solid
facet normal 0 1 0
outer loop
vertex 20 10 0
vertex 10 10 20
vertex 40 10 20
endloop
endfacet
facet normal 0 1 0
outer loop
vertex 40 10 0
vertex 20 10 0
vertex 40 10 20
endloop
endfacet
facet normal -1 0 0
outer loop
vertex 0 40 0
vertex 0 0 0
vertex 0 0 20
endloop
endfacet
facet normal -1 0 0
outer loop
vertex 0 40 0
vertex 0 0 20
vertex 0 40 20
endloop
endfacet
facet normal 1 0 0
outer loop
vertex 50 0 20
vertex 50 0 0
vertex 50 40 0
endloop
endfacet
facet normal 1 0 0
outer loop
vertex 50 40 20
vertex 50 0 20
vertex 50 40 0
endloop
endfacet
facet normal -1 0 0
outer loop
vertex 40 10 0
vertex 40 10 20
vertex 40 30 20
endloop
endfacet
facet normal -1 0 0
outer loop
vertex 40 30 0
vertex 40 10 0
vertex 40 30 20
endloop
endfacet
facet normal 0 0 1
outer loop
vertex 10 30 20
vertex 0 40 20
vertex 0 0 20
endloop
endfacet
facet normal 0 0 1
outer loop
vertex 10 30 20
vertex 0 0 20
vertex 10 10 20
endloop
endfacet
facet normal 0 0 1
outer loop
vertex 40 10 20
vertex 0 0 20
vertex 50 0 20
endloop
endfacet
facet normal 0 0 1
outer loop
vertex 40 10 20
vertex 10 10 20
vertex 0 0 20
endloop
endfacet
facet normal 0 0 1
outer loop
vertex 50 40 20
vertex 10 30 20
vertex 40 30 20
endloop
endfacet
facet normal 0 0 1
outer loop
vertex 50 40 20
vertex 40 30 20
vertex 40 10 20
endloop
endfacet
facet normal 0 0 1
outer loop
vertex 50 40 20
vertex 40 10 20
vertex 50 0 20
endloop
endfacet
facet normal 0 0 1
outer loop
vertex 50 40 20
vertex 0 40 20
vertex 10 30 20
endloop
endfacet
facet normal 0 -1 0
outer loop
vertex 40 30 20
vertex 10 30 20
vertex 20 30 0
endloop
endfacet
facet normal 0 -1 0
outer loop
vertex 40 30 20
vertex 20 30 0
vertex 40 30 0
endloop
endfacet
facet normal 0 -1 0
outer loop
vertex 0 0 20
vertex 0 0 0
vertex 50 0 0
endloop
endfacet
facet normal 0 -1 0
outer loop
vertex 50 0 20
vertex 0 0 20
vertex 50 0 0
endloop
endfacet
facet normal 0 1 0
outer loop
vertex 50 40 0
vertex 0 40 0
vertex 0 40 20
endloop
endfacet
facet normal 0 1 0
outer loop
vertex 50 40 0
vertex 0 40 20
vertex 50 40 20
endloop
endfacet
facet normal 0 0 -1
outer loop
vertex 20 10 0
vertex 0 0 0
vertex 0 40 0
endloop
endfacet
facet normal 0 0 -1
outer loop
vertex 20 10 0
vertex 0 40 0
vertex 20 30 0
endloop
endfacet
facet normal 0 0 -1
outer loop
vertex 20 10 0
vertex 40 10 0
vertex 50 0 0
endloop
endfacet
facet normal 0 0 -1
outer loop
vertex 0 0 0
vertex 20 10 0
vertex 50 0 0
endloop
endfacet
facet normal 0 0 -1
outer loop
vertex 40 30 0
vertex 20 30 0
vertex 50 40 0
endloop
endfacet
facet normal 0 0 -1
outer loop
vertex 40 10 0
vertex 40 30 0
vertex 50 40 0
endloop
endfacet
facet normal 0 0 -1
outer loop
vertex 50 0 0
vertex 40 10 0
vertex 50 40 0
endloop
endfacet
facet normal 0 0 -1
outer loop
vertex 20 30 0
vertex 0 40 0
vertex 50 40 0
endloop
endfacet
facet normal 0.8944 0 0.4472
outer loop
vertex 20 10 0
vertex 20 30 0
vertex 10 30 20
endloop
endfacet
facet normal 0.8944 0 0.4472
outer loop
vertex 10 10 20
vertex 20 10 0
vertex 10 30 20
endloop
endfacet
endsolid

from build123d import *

# Parameters (mm, degrees)
F0_W     = 50
F0_H     = 40
F1_DEPTH = 20
F2_W     = 30
F2_H     = 20
F3_DEPTH = 20
F5_DEPTH = 20


with BuildPart() as f1:
    # F0 (on Top) → F1 (new body)
    with BuildSketch(Plane.XY):
        with Locations((25, 20)):
            Rectangle(F0_W, F0_H)
    extrude(amount=F1_DEPTH)

    # F2 (on face) → F3 (cut)
    with BuildSketch(Plane.XY.offset(20)):
        with Locations((25, 20)):
            Rectangle(F2_W, F2_H)
    extrude(amount=-F3_DEPTH, mode=Mode.SUBTRACT)

    # F4 (on face) → F5 (join)
    with BuildSketch(Plane.XZ.offset(-30)):
        Polygon((20, 0), (10, 20), (10, 0), align=None)
    extrude(amount=F5_DEPTH)


solid = f1.part
